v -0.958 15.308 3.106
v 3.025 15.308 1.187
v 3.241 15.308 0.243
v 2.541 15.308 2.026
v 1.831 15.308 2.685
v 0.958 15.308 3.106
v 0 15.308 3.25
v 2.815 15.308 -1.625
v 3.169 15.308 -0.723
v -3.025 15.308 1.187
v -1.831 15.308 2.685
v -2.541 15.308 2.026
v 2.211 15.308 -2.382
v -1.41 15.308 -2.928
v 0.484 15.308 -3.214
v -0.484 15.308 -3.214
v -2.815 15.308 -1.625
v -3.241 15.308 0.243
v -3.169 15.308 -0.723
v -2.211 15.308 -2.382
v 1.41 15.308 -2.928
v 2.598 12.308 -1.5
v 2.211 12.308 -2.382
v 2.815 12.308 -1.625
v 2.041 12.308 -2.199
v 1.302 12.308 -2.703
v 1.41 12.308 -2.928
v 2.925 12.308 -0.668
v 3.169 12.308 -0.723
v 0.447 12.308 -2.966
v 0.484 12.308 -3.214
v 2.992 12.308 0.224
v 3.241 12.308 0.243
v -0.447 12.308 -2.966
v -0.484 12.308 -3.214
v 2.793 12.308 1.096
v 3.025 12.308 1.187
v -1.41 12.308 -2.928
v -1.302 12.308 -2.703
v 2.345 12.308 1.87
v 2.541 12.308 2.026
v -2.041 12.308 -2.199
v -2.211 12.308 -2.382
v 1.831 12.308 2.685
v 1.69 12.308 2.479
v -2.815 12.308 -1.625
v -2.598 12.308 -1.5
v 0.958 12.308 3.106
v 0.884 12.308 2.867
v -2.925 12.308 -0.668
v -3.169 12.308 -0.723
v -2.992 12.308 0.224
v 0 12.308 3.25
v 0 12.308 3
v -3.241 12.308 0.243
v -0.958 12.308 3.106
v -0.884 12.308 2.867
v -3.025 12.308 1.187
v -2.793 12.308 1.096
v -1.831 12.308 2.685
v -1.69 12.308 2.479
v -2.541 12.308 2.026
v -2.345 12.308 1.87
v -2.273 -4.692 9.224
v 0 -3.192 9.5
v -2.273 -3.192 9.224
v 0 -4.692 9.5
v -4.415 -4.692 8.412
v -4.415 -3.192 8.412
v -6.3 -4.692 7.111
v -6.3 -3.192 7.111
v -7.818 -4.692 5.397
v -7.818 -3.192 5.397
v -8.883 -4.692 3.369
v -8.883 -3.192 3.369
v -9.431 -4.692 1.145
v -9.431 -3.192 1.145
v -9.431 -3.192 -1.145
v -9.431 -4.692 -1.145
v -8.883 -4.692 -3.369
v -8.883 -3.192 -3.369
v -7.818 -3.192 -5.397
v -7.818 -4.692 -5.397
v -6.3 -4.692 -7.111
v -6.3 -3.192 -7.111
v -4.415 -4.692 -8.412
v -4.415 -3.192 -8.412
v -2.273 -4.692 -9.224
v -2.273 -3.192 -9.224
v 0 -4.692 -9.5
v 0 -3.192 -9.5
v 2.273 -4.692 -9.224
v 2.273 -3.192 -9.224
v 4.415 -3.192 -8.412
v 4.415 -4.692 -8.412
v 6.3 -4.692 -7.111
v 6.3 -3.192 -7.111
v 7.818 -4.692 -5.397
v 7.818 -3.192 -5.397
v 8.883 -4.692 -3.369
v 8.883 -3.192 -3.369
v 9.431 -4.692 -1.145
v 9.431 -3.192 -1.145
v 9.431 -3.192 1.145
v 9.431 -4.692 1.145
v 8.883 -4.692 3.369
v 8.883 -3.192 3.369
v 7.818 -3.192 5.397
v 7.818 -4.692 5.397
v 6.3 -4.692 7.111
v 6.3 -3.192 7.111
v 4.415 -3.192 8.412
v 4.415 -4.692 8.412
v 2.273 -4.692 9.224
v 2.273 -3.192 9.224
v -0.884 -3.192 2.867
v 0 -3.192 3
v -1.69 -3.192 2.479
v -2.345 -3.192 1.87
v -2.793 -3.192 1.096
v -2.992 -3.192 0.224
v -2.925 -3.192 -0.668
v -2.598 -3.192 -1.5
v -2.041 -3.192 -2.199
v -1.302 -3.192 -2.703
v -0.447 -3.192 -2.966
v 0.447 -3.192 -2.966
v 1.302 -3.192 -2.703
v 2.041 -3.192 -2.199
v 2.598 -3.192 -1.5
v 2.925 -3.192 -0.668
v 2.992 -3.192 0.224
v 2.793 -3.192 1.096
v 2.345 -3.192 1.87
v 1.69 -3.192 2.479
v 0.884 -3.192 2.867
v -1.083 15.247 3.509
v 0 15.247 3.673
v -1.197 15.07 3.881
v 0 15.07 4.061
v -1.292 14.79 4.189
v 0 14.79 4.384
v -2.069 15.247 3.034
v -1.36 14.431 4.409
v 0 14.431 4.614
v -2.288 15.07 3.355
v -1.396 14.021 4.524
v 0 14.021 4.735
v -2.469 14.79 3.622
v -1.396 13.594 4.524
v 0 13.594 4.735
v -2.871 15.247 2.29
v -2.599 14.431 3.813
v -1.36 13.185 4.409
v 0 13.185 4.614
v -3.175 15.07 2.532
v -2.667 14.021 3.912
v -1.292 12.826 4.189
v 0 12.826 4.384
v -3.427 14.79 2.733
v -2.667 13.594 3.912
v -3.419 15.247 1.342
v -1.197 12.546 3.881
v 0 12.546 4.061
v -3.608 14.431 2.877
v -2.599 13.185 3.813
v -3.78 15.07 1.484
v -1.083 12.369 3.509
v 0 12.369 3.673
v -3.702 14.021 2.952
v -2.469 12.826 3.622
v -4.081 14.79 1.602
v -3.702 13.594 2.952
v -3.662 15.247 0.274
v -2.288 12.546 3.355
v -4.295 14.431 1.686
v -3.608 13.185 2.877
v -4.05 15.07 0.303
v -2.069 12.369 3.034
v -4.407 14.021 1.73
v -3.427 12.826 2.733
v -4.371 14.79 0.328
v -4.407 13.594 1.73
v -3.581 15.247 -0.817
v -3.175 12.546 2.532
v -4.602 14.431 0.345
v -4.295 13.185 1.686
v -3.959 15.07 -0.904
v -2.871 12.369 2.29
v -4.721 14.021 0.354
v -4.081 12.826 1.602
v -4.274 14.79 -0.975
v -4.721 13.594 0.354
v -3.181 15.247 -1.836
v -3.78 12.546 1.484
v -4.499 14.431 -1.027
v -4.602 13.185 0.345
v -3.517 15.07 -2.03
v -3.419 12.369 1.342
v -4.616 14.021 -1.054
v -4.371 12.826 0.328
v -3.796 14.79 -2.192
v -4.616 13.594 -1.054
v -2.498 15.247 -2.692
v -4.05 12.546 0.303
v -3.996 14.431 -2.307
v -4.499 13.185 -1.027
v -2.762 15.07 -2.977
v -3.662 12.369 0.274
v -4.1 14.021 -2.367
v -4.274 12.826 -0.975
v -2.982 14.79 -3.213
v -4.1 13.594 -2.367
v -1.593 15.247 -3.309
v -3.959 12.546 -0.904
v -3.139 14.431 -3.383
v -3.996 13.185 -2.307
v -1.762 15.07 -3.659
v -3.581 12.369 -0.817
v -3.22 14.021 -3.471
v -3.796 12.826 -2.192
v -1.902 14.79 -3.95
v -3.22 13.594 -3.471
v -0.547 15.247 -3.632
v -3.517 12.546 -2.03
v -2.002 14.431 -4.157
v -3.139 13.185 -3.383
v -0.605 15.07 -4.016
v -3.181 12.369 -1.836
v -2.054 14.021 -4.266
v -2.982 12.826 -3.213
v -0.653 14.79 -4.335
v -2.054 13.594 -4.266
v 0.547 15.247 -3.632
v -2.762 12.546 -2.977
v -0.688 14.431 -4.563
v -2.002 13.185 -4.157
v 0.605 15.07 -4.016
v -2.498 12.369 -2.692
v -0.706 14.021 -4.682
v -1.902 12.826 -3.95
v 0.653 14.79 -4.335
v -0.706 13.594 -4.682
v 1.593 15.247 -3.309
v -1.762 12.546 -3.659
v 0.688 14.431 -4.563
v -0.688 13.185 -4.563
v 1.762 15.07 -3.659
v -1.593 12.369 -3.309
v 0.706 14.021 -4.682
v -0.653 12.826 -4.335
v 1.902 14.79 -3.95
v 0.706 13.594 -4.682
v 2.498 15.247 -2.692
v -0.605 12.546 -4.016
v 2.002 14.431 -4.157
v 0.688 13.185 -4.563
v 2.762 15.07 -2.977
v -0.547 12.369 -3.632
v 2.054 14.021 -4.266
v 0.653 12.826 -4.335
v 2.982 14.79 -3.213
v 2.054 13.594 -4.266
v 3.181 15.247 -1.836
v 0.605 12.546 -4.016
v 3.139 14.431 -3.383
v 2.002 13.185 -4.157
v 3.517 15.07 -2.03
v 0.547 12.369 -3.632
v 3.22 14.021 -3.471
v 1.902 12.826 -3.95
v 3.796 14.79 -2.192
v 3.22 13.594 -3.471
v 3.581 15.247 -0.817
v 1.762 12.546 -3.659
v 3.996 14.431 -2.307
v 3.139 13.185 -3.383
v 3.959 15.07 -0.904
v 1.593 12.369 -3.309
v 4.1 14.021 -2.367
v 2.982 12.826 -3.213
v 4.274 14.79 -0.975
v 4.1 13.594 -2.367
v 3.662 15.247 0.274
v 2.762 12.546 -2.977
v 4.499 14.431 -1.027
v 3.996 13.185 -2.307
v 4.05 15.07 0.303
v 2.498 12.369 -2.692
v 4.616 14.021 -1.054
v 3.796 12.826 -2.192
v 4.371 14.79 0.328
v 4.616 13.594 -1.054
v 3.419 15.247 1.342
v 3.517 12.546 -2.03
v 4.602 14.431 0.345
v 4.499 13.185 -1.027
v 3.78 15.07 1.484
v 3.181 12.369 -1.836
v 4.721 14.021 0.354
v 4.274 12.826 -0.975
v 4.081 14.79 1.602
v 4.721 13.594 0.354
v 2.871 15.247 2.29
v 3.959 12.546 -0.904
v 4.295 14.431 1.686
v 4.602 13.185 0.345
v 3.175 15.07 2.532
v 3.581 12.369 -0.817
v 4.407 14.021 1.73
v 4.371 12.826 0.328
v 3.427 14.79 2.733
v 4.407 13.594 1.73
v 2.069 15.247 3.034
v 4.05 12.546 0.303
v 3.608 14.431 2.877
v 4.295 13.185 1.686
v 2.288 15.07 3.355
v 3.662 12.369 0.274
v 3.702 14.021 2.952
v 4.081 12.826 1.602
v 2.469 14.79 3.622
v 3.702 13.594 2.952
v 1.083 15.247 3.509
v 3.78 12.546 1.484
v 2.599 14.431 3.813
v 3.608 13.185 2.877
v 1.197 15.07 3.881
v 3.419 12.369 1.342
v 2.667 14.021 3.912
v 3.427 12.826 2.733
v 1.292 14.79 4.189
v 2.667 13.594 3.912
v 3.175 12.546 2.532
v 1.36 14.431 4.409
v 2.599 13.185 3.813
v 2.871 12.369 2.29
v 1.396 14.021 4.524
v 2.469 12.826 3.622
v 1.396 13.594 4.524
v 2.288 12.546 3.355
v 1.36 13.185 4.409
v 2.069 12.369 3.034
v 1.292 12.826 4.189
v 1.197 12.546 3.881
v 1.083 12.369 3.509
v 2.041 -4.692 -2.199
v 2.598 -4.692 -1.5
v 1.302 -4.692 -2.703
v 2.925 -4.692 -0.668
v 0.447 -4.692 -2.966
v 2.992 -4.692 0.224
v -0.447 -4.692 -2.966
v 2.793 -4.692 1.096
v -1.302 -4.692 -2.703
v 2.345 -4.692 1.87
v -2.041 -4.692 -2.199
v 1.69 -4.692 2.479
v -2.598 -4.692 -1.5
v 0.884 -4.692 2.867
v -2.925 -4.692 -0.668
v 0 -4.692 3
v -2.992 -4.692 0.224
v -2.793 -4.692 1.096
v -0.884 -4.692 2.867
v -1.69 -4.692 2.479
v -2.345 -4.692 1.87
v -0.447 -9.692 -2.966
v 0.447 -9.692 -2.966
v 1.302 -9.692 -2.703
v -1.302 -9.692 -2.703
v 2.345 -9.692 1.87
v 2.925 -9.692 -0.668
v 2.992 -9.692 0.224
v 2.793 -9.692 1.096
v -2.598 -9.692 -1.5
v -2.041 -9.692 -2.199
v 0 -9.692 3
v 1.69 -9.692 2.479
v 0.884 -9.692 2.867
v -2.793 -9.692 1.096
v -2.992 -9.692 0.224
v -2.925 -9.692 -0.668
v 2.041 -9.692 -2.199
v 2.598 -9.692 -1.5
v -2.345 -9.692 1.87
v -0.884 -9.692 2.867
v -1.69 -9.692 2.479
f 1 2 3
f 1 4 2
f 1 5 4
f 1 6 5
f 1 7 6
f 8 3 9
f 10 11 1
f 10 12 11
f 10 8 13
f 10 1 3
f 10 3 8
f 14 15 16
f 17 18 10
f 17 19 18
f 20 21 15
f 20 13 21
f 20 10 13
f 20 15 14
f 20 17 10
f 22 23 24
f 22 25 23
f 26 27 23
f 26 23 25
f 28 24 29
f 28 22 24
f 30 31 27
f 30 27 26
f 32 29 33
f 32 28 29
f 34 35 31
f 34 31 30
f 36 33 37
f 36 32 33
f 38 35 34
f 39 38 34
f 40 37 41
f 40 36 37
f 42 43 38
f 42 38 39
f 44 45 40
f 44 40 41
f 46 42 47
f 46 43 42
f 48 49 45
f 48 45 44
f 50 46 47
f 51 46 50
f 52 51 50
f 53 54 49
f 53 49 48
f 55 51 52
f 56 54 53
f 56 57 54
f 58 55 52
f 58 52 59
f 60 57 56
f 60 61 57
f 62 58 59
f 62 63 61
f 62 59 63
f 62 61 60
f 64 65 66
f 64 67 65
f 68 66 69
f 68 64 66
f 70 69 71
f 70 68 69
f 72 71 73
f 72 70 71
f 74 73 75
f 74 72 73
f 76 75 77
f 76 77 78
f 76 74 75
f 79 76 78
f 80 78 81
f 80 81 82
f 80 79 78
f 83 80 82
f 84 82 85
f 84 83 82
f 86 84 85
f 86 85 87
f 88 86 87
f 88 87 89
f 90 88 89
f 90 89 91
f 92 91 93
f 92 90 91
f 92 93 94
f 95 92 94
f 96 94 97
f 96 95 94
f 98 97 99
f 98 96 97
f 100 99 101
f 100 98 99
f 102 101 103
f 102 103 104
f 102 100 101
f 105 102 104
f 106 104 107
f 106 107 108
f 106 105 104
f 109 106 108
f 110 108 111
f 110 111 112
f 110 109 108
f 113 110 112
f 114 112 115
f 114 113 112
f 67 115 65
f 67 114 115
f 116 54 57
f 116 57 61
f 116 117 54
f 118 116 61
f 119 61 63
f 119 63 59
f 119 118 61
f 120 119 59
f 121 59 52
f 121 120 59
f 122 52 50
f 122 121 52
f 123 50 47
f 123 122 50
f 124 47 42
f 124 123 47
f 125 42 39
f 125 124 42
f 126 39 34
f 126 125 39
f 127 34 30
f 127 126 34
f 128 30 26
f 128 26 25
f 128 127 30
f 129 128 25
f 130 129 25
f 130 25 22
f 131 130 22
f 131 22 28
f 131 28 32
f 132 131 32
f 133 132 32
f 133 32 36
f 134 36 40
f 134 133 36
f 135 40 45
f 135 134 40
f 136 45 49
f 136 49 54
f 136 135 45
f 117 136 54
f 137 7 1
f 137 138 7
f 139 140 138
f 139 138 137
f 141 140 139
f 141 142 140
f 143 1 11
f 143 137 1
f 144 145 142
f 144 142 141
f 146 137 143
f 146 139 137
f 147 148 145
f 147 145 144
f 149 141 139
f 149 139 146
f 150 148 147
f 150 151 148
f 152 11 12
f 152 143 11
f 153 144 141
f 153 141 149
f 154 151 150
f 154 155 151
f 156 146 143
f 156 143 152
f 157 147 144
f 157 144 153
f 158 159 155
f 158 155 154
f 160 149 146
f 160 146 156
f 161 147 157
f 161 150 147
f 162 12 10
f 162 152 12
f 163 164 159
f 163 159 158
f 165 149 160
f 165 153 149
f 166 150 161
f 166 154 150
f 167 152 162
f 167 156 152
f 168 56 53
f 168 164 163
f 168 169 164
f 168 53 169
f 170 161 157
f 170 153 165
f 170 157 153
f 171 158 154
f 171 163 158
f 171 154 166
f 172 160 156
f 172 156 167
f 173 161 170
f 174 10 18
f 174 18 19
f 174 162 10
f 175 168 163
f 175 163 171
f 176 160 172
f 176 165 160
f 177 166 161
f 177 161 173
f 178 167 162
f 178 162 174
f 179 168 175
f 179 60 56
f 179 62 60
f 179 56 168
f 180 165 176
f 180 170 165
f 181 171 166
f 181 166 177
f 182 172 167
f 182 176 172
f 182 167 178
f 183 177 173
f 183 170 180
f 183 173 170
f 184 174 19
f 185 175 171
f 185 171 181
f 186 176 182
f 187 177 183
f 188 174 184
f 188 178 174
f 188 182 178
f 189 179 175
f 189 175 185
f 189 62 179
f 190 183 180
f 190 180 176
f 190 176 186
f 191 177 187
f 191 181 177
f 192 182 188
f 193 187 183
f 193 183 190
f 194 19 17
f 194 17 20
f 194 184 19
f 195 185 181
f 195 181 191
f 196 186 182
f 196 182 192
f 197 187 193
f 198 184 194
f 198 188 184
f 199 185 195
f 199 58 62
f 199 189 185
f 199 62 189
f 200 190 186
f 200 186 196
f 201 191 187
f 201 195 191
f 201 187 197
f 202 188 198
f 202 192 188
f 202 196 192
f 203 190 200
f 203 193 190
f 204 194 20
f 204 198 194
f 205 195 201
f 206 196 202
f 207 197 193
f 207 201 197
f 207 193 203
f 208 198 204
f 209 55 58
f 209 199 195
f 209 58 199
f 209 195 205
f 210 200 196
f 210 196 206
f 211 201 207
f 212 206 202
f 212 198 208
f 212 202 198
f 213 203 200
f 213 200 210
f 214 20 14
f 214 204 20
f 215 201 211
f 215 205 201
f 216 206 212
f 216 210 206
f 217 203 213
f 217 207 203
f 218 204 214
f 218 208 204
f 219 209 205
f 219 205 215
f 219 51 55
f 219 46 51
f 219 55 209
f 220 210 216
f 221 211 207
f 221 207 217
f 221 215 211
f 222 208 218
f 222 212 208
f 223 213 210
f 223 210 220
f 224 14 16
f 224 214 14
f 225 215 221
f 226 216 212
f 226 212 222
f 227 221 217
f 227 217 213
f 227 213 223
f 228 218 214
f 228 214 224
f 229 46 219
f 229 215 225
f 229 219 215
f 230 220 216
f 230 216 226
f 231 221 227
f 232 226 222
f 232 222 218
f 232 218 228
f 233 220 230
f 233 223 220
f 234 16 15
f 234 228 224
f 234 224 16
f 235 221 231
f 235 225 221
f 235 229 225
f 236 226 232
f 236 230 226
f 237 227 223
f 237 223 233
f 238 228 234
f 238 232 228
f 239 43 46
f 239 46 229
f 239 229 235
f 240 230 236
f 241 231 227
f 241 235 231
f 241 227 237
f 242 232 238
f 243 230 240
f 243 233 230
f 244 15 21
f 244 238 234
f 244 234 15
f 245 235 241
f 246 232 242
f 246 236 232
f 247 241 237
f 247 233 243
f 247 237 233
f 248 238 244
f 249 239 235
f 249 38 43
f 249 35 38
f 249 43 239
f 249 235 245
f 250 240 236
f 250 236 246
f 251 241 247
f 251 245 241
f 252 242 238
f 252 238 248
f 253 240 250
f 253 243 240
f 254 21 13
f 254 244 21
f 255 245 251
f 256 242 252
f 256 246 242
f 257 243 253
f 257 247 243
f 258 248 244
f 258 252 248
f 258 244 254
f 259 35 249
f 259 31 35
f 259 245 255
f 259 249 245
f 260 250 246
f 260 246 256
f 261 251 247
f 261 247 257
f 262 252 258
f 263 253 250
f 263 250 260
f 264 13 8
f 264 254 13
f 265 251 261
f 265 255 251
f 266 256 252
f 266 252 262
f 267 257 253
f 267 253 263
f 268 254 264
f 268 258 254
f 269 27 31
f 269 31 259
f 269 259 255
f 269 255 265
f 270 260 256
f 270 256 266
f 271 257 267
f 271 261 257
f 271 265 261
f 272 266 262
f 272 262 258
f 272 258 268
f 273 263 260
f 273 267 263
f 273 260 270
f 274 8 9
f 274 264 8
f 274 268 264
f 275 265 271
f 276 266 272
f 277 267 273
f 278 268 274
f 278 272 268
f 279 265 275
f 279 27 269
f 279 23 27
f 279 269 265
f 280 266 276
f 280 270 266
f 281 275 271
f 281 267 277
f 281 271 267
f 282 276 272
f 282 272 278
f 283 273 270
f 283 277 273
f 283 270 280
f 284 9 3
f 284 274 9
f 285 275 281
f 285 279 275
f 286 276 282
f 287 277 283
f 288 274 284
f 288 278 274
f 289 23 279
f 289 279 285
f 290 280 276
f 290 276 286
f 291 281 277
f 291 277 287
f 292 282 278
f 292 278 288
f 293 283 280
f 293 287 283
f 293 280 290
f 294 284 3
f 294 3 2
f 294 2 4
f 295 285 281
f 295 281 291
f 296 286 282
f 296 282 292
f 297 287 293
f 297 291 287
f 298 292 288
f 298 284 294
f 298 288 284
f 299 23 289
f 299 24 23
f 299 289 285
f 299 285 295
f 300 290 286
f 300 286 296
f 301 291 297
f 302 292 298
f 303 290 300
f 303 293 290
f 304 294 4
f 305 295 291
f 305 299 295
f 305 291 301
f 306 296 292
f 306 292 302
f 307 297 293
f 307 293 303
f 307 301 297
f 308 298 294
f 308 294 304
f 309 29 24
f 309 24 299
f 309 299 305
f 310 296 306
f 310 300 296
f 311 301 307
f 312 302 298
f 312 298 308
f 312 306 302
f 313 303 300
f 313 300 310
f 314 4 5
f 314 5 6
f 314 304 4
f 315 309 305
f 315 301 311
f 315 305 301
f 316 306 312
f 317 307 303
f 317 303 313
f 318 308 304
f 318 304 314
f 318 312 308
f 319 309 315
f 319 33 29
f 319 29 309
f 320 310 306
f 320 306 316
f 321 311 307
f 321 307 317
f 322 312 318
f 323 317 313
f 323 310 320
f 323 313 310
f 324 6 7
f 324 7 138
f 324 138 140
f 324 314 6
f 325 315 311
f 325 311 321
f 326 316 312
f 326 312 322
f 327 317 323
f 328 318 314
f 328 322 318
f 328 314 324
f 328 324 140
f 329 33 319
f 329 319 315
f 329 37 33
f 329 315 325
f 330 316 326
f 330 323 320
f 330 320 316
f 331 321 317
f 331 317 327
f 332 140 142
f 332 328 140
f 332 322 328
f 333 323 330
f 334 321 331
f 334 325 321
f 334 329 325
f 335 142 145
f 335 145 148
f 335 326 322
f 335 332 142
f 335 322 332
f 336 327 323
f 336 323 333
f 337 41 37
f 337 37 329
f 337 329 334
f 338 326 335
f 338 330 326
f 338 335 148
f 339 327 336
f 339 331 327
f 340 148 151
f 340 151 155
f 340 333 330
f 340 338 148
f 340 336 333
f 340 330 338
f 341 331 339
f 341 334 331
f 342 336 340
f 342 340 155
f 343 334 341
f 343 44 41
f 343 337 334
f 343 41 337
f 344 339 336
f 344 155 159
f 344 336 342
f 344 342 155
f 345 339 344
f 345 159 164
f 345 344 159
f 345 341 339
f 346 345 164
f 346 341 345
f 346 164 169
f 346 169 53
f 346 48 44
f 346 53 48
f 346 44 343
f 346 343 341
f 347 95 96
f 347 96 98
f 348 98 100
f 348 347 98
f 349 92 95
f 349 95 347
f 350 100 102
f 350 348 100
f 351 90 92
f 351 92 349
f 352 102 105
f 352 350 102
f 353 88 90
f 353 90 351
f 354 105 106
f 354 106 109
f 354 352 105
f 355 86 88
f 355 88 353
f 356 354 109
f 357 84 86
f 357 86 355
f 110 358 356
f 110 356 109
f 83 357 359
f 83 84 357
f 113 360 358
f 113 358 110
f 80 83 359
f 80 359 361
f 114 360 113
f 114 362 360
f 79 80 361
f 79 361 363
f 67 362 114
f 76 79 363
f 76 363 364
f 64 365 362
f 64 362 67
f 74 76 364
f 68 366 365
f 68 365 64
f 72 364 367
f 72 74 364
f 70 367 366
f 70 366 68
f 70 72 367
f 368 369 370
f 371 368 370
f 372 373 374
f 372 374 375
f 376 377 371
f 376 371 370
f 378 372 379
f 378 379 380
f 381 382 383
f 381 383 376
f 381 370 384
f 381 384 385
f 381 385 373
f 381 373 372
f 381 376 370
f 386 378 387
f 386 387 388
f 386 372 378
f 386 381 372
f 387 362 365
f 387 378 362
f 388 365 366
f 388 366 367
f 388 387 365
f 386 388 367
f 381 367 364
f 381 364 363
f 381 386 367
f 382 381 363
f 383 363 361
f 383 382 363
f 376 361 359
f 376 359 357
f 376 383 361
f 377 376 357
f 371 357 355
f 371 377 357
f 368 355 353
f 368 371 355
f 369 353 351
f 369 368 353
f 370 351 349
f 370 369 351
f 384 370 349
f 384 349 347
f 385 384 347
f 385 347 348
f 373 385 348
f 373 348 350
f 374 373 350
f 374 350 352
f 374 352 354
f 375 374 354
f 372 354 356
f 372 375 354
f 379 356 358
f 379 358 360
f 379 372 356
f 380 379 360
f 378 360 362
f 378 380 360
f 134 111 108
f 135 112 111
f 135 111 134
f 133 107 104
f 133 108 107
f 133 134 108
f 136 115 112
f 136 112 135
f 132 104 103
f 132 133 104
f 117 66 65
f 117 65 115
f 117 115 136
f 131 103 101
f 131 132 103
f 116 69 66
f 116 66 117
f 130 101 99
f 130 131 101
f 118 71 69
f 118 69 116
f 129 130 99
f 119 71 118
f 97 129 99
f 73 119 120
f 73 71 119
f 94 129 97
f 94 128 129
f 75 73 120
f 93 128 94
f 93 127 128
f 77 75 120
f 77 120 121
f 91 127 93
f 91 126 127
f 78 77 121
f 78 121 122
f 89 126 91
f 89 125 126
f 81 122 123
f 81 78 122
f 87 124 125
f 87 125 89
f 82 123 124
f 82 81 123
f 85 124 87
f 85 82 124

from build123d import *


with BuildPart() as part:
    # Эскиз1 → Повернуть2 (revolve)
    with BuildSketch(Plane.XY, mode=Mode.PRIVATE) as revolve_2_sk:
        with BuildLine():
            Line((3, 12.30781391), (3, -3.19218609))
            Line((3, -3.19218609), (9.5, -3.19218609))
            Line((9.5, -3.19218609), (9.5, -4.69218609))
            Line((9.5, -4.69218609), (3, -4.69218609))
            Line((3, -4.69218609), (3, -9.69218609))
            Line((3, -9.69218609), (0, -9.69218609))
            Line((0, -9.69218609), (0, 15.30781391))
            Line((0, 15.30781391), (3.25, 15.30781391))
            ThreePointArc((3.25, 15.30781391), (4.75, 13.80781391), (3.25, 12.30781391))
            Line((3.25, 12.30781391), (3, 12.30781391))
        make_face()
    revolve(revolve_2_sk.sketch.rotate(Axis((0, 15.673981191, 0), (0, -1, 0)), 90), axis=Axis((0, 15.673981191, 0), (0, -1, 0)))


solid = part.part
